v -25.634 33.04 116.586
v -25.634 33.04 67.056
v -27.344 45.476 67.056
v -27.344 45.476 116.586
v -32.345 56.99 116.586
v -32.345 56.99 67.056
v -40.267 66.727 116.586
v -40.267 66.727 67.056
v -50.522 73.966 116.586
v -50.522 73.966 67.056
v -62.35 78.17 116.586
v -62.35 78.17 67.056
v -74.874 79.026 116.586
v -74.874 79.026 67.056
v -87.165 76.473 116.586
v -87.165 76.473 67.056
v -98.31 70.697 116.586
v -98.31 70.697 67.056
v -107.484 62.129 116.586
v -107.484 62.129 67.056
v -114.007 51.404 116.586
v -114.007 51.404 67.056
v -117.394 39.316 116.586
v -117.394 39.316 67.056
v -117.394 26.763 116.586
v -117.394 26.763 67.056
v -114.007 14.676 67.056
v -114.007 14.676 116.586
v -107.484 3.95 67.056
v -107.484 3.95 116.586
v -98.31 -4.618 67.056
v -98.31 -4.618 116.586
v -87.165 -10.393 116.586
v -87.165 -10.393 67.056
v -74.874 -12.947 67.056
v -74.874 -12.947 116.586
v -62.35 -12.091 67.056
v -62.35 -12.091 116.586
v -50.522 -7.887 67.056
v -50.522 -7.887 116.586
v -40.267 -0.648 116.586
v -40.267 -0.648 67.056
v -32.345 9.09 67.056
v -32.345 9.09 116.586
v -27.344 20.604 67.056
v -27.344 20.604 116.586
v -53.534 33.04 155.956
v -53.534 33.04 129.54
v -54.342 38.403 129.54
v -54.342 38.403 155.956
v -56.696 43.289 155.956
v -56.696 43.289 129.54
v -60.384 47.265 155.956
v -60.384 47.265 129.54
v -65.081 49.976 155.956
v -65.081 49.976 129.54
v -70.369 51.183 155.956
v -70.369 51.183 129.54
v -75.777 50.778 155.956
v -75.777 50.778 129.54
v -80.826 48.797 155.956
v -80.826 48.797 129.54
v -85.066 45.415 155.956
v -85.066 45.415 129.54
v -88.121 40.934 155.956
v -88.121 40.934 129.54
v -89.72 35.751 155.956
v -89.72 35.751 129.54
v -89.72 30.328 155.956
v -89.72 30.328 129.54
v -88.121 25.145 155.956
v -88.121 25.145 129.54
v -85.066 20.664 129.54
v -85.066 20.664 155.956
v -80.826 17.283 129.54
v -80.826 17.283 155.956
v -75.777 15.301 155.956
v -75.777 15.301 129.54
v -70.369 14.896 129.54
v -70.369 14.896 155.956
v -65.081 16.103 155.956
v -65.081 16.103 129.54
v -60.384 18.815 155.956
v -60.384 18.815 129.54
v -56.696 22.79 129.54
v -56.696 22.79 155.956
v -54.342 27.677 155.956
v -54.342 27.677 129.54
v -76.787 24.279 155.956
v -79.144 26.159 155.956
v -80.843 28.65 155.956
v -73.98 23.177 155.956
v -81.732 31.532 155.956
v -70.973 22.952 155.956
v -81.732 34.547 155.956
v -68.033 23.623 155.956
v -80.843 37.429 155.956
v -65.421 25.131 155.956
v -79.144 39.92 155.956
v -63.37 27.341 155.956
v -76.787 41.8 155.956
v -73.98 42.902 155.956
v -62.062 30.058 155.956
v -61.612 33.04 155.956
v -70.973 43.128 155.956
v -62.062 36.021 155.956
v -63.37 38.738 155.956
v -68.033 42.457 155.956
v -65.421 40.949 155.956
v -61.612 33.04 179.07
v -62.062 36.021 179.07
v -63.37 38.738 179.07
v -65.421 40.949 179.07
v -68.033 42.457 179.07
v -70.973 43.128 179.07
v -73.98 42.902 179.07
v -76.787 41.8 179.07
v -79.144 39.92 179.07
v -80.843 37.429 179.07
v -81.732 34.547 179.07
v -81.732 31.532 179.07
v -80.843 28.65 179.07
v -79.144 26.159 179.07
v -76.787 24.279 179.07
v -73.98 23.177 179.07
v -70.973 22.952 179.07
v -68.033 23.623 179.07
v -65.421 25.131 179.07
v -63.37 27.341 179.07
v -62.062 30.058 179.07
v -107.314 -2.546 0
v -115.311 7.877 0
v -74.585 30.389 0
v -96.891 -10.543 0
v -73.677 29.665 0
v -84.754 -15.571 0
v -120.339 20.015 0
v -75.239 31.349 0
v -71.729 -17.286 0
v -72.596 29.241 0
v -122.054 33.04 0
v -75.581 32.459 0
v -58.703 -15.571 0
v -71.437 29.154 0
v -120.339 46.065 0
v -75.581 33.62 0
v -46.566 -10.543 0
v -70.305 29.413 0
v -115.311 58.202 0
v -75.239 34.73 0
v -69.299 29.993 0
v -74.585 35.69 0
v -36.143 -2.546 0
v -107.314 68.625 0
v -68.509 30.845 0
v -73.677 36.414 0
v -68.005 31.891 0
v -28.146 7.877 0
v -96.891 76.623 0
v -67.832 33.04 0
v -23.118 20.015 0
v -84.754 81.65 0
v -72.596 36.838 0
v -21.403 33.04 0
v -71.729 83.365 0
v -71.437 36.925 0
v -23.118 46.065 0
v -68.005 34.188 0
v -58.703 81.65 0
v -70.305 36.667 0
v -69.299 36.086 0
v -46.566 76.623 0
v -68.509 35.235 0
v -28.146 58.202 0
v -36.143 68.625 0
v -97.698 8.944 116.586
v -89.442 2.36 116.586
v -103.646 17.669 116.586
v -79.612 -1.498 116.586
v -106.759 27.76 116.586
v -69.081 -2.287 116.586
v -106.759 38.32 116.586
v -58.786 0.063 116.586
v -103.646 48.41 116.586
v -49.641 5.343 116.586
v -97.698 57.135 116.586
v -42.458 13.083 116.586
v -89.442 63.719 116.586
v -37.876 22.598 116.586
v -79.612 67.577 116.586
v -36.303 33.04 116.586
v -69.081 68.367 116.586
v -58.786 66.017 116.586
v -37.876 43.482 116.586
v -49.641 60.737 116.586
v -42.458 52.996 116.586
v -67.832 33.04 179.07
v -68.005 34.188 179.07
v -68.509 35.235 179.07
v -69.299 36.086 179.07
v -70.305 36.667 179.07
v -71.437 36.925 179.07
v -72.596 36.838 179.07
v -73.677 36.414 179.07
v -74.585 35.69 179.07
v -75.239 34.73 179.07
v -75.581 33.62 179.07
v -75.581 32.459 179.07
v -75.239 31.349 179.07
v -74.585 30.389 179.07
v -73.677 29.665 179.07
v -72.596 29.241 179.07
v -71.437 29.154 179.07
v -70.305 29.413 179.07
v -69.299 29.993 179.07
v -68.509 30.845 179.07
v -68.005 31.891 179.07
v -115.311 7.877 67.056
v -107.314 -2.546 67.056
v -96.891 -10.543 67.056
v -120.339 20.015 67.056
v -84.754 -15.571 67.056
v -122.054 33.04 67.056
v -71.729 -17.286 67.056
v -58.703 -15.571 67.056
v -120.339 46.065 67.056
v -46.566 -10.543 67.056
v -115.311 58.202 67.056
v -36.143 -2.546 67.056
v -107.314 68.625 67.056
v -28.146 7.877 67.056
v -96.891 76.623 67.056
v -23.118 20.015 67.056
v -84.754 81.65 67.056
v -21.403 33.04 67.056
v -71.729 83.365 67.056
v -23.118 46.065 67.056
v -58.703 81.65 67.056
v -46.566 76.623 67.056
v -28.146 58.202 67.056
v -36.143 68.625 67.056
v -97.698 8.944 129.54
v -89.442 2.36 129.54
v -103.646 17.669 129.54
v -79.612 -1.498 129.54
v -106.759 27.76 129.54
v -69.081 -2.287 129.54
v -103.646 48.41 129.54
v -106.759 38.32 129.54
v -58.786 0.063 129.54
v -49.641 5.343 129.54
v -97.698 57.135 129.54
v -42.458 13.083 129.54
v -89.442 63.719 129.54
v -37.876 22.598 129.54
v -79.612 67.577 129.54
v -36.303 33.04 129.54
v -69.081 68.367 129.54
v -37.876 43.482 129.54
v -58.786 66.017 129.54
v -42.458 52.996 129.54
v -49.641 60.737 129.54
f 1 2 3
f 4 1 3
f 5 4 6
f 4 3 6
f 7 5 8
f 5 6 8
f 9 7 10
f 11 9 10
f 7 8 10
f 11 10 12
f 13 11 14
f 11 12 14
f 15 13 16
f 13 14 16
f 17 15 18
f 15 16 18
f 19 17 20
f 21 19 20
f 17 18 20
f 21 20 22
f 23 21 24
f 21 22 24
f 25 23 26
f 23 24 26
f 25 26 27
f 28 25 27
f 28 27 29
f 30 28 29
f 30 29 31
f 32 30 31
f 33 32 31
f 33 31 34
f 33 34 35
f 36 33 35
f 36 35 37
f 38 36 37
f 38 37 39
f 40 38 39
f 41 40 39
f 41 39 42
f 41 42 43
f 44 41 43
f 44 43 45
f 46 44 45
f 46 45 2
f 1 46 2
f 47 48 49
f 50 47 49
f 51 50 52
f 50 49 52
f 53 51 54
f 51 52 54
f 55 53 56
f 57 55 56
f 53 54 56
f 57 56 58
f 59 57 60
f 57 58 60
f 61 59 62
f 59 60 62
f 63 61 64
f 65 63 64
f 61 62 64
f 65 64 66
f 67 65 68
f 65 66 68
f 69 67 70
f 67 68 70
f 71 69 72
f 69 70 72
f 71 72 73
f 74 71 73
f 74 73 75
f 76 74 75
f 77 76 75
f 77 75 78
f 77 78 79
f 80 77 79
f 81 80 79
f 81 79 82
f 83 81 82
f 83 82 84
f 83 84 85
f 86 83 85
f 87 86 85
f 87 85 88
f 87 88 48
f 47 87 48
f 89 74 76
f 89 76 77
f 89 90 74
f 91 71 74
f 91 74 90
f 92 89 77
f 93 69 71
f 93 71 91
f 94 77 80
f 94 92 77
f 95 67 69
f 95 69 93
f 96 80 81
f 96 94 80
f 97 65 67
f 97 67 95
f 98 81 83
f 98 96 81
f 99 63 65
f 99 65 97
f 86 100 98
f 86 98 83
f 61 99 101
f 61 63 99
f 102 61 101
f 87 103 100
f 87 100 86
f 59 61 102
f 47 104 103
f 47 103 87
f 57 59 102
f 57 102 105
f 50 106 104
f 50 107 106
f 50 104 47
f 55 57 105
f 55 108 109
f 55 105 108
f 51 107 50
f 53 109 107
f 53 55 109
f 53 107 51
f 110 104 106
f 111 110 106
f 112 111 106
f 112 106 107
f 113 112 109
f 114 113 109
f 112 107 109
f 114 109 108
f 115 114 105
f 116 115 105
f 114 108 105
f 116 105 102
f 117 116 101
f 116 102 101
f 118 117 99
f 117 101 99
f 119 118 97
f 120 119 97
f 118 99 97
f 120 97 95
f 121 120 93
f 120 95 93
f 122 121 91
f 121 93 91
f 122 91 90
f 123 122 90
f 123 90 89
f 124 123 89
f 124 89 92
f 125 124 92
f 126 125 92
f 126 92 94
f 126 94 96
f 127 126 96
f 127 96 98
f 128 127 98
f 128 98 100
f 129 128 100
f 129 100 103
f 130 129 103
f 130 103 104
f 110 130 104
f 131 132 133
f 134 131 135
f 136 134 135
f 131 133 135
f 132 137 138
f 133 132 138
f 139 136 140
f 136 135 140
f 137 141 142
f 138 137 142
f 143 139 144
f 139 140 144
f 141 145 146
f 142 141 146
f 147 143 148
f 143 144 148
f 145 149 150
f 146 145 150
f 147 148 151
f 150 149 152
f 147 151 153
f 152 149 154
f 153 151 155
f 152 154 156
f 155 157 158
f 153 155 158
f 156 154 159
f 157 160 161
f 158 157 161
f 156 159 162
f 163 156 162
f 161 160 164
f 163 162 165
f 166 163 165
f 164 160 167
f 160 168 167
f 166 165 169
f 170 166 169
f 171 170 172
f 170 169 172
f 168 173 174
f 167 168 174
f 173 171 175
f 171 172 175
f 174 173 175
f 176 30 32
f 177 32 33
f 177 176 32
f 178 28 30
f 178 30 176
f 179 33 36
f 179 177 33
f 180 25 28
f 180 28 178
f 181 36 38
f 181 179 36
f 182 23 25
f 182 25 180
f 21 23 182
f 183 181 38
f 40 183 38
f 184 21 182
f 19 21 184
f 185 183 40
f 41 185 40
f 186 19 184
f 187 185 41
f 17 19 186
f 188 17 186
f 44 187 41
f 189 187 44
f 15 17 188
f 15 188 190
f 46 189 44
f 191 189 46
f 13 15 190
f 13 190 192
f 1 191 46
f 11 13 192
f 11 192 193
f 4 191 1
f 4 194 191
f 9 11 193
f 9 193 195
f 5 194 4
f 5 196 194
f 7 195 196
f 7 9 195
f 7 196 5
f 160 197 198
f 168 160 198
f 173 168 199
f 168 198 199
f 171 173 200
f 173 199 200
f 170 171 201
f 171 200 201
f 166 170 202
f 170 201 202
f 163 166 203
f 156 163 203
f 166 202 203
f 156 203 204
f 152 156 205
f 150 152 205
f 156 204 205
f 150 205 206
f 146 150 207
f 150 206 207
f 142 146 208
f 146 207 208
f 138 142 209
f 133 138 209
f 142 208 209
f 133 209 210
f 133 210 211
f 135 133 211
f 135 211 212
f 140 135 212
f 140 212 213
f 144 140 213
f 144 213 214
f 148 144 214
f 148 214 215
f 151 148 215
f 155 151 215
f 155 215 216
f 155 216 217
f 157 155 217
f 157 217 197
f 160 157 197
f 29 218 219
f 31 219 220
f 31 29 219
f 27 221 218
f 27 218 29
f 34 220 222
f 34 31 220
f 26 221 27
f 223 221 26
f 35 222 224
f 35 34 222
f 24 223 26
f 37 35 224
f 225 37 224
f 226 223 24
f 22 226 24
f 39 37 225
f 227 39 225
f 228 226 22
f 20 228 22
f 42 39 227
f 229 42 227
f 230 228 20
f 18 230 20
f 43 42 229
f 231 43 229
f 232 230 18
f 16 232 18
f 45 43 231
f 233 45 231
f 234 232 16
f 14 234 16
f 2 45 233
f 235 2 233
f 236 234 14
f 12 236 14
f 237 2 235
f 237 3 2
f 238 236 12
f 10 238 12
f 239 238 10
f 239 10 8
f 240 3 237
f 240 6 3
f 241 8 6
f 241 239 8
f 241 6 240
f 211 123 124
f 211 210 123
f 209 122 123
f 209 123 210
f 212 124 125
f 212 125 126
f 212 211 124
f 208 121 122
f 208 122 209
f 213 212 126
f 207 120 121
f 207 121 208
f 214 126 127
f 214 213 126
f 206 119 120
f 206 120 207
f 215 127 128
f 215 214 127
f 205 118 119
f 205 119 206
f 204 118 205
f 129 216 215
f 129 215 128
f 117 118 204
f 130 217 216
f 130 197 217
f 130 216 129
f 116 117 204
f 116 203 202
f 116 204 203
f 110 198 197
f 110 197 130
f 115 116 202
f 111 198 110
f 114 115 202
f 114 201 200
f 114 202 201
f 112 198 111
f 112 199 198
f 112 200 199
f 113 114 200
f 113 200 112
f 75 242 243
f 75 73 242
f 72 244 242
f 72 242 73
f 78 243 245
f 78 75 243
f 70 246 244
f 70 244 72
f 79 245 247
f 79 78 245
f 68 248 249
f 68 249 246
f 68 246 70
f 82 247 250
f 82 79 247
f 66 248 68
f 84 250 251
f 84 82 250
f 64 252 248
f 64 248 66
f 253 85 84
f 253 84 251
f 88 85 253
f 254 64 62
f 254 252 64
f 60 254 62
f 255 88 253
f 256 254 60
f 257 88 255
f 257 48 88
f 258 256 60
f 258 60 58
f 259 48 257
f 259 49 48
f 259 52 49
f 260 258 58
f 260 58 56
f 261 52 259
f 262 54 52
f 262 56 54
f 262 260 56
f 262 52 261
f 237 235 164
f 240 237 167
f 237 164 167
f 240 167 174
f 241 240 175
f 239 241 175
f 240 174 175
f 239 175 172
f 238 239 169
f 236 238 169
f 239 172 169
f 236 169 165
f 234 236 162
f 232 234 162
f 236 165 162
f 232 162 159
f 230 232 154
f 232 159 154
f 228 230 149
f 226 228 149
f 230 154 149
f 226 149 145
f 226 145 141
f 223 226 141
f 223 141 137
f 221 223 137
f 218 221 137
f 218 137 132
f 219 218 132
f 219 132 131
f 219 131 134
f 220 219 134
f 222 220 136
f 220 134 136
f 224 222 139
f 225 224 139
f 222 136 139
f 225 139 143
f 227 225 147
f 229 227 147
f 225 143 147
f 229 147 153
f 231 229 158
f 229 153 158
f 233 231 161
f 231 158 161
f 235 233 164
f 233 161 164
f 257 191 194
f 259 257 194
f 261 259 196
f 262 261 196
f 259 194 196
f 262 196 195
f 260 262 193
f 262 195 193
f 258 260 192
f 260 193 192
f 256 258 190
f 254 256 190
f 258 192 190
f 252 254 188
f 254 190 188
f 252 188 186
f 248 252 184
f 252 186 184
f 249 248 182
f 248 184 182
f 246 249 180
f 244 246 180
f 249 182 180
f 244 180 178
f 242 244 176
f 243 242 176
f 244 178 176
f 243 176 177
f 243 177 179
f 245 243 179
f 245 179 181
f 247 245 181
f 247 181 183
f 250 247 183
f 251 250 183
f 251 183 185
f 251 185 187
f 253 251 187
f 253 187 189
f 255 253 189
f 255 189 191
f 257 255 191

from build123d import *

# Parameters (mm, degrees)
F0_R     = 10.116147
F1_DEPTH = 179.07
F0_R_2   = 18.194512
F2_DEPTH = 155.956
F0_R_3   = 35.425969
F3_DEPTH = 129.54
F0_R_4   = 46.094292
F4_DEPTH = 116.586
F0_R_5   = 50.325177
F5_DEPTH = 67.056
F6_R     = 3.896404
F7_DEPTH = 411.226


with BuildPart() as f1:
    # F0 (on Top) → F1 (new body)
    with BuildSketch(Plane.XY):
        with Locations((-71.728565, 33.039652)):
            Circle(F0_R)
    extrude(amount=F1_DEPTH)

    # F0 (on Top) → F2 (join)
    with BuildSketch(Plane.XY):
        with Locations((-71.728565, 33.039652)):
            Circle(F0_R_2)
        with Locations((-71.728565, 33.039652)):
            Circle(F0_R, mode=Mode.SUBTRACT)
    extrude(amount=F2_DEPTH)

    # F0 (on Top) → F3 (join)
    with BuildSketch(Plane.XY):
        with Locations((-71.728565, 33.039652)):
            Circle(F0_R_3)
        with Locations((-71.728565, 33.039652)):
            Circle(F0_R_2, mode=Mode.SUBTRACT)
    extrude(amount=F3_DEPTH)

    # F0 (on Top) → F4 (join)
    with BuildSketch(Plane.XY):
        with Locations((-71.728565, 33.039652)):
            Circle(F0_R_4)
        with Locations((-71.728565, 33.039652)):
            Circle(F0_R_3, mode=Mode.SUBTRACT)
    extrude(amount=F4_DEPTH)

    # F0 (on Top) → F5 (join)
    with BuildSketch(Plane.XY):
        with Locations((-71.728565, 33.039652)):
            Circle(F0_R_5)
        with Locations((-71.728565, 33.039652)):
            Circle(F0_R_4, mode=Mode.SUBTRACT)
    extrude(amount=F5_DEPTH)

    # F6 (on face) → F7 (cut)
    with BuildSketch(Plane.XY.offset(179.07)):
        with Locations((-71.728565, 33.039652)):
            Circle(F6_R)
    extrude(amount=-F7_DEPTH, mode=Mode.SUBTRACT)


solid = f1.part
